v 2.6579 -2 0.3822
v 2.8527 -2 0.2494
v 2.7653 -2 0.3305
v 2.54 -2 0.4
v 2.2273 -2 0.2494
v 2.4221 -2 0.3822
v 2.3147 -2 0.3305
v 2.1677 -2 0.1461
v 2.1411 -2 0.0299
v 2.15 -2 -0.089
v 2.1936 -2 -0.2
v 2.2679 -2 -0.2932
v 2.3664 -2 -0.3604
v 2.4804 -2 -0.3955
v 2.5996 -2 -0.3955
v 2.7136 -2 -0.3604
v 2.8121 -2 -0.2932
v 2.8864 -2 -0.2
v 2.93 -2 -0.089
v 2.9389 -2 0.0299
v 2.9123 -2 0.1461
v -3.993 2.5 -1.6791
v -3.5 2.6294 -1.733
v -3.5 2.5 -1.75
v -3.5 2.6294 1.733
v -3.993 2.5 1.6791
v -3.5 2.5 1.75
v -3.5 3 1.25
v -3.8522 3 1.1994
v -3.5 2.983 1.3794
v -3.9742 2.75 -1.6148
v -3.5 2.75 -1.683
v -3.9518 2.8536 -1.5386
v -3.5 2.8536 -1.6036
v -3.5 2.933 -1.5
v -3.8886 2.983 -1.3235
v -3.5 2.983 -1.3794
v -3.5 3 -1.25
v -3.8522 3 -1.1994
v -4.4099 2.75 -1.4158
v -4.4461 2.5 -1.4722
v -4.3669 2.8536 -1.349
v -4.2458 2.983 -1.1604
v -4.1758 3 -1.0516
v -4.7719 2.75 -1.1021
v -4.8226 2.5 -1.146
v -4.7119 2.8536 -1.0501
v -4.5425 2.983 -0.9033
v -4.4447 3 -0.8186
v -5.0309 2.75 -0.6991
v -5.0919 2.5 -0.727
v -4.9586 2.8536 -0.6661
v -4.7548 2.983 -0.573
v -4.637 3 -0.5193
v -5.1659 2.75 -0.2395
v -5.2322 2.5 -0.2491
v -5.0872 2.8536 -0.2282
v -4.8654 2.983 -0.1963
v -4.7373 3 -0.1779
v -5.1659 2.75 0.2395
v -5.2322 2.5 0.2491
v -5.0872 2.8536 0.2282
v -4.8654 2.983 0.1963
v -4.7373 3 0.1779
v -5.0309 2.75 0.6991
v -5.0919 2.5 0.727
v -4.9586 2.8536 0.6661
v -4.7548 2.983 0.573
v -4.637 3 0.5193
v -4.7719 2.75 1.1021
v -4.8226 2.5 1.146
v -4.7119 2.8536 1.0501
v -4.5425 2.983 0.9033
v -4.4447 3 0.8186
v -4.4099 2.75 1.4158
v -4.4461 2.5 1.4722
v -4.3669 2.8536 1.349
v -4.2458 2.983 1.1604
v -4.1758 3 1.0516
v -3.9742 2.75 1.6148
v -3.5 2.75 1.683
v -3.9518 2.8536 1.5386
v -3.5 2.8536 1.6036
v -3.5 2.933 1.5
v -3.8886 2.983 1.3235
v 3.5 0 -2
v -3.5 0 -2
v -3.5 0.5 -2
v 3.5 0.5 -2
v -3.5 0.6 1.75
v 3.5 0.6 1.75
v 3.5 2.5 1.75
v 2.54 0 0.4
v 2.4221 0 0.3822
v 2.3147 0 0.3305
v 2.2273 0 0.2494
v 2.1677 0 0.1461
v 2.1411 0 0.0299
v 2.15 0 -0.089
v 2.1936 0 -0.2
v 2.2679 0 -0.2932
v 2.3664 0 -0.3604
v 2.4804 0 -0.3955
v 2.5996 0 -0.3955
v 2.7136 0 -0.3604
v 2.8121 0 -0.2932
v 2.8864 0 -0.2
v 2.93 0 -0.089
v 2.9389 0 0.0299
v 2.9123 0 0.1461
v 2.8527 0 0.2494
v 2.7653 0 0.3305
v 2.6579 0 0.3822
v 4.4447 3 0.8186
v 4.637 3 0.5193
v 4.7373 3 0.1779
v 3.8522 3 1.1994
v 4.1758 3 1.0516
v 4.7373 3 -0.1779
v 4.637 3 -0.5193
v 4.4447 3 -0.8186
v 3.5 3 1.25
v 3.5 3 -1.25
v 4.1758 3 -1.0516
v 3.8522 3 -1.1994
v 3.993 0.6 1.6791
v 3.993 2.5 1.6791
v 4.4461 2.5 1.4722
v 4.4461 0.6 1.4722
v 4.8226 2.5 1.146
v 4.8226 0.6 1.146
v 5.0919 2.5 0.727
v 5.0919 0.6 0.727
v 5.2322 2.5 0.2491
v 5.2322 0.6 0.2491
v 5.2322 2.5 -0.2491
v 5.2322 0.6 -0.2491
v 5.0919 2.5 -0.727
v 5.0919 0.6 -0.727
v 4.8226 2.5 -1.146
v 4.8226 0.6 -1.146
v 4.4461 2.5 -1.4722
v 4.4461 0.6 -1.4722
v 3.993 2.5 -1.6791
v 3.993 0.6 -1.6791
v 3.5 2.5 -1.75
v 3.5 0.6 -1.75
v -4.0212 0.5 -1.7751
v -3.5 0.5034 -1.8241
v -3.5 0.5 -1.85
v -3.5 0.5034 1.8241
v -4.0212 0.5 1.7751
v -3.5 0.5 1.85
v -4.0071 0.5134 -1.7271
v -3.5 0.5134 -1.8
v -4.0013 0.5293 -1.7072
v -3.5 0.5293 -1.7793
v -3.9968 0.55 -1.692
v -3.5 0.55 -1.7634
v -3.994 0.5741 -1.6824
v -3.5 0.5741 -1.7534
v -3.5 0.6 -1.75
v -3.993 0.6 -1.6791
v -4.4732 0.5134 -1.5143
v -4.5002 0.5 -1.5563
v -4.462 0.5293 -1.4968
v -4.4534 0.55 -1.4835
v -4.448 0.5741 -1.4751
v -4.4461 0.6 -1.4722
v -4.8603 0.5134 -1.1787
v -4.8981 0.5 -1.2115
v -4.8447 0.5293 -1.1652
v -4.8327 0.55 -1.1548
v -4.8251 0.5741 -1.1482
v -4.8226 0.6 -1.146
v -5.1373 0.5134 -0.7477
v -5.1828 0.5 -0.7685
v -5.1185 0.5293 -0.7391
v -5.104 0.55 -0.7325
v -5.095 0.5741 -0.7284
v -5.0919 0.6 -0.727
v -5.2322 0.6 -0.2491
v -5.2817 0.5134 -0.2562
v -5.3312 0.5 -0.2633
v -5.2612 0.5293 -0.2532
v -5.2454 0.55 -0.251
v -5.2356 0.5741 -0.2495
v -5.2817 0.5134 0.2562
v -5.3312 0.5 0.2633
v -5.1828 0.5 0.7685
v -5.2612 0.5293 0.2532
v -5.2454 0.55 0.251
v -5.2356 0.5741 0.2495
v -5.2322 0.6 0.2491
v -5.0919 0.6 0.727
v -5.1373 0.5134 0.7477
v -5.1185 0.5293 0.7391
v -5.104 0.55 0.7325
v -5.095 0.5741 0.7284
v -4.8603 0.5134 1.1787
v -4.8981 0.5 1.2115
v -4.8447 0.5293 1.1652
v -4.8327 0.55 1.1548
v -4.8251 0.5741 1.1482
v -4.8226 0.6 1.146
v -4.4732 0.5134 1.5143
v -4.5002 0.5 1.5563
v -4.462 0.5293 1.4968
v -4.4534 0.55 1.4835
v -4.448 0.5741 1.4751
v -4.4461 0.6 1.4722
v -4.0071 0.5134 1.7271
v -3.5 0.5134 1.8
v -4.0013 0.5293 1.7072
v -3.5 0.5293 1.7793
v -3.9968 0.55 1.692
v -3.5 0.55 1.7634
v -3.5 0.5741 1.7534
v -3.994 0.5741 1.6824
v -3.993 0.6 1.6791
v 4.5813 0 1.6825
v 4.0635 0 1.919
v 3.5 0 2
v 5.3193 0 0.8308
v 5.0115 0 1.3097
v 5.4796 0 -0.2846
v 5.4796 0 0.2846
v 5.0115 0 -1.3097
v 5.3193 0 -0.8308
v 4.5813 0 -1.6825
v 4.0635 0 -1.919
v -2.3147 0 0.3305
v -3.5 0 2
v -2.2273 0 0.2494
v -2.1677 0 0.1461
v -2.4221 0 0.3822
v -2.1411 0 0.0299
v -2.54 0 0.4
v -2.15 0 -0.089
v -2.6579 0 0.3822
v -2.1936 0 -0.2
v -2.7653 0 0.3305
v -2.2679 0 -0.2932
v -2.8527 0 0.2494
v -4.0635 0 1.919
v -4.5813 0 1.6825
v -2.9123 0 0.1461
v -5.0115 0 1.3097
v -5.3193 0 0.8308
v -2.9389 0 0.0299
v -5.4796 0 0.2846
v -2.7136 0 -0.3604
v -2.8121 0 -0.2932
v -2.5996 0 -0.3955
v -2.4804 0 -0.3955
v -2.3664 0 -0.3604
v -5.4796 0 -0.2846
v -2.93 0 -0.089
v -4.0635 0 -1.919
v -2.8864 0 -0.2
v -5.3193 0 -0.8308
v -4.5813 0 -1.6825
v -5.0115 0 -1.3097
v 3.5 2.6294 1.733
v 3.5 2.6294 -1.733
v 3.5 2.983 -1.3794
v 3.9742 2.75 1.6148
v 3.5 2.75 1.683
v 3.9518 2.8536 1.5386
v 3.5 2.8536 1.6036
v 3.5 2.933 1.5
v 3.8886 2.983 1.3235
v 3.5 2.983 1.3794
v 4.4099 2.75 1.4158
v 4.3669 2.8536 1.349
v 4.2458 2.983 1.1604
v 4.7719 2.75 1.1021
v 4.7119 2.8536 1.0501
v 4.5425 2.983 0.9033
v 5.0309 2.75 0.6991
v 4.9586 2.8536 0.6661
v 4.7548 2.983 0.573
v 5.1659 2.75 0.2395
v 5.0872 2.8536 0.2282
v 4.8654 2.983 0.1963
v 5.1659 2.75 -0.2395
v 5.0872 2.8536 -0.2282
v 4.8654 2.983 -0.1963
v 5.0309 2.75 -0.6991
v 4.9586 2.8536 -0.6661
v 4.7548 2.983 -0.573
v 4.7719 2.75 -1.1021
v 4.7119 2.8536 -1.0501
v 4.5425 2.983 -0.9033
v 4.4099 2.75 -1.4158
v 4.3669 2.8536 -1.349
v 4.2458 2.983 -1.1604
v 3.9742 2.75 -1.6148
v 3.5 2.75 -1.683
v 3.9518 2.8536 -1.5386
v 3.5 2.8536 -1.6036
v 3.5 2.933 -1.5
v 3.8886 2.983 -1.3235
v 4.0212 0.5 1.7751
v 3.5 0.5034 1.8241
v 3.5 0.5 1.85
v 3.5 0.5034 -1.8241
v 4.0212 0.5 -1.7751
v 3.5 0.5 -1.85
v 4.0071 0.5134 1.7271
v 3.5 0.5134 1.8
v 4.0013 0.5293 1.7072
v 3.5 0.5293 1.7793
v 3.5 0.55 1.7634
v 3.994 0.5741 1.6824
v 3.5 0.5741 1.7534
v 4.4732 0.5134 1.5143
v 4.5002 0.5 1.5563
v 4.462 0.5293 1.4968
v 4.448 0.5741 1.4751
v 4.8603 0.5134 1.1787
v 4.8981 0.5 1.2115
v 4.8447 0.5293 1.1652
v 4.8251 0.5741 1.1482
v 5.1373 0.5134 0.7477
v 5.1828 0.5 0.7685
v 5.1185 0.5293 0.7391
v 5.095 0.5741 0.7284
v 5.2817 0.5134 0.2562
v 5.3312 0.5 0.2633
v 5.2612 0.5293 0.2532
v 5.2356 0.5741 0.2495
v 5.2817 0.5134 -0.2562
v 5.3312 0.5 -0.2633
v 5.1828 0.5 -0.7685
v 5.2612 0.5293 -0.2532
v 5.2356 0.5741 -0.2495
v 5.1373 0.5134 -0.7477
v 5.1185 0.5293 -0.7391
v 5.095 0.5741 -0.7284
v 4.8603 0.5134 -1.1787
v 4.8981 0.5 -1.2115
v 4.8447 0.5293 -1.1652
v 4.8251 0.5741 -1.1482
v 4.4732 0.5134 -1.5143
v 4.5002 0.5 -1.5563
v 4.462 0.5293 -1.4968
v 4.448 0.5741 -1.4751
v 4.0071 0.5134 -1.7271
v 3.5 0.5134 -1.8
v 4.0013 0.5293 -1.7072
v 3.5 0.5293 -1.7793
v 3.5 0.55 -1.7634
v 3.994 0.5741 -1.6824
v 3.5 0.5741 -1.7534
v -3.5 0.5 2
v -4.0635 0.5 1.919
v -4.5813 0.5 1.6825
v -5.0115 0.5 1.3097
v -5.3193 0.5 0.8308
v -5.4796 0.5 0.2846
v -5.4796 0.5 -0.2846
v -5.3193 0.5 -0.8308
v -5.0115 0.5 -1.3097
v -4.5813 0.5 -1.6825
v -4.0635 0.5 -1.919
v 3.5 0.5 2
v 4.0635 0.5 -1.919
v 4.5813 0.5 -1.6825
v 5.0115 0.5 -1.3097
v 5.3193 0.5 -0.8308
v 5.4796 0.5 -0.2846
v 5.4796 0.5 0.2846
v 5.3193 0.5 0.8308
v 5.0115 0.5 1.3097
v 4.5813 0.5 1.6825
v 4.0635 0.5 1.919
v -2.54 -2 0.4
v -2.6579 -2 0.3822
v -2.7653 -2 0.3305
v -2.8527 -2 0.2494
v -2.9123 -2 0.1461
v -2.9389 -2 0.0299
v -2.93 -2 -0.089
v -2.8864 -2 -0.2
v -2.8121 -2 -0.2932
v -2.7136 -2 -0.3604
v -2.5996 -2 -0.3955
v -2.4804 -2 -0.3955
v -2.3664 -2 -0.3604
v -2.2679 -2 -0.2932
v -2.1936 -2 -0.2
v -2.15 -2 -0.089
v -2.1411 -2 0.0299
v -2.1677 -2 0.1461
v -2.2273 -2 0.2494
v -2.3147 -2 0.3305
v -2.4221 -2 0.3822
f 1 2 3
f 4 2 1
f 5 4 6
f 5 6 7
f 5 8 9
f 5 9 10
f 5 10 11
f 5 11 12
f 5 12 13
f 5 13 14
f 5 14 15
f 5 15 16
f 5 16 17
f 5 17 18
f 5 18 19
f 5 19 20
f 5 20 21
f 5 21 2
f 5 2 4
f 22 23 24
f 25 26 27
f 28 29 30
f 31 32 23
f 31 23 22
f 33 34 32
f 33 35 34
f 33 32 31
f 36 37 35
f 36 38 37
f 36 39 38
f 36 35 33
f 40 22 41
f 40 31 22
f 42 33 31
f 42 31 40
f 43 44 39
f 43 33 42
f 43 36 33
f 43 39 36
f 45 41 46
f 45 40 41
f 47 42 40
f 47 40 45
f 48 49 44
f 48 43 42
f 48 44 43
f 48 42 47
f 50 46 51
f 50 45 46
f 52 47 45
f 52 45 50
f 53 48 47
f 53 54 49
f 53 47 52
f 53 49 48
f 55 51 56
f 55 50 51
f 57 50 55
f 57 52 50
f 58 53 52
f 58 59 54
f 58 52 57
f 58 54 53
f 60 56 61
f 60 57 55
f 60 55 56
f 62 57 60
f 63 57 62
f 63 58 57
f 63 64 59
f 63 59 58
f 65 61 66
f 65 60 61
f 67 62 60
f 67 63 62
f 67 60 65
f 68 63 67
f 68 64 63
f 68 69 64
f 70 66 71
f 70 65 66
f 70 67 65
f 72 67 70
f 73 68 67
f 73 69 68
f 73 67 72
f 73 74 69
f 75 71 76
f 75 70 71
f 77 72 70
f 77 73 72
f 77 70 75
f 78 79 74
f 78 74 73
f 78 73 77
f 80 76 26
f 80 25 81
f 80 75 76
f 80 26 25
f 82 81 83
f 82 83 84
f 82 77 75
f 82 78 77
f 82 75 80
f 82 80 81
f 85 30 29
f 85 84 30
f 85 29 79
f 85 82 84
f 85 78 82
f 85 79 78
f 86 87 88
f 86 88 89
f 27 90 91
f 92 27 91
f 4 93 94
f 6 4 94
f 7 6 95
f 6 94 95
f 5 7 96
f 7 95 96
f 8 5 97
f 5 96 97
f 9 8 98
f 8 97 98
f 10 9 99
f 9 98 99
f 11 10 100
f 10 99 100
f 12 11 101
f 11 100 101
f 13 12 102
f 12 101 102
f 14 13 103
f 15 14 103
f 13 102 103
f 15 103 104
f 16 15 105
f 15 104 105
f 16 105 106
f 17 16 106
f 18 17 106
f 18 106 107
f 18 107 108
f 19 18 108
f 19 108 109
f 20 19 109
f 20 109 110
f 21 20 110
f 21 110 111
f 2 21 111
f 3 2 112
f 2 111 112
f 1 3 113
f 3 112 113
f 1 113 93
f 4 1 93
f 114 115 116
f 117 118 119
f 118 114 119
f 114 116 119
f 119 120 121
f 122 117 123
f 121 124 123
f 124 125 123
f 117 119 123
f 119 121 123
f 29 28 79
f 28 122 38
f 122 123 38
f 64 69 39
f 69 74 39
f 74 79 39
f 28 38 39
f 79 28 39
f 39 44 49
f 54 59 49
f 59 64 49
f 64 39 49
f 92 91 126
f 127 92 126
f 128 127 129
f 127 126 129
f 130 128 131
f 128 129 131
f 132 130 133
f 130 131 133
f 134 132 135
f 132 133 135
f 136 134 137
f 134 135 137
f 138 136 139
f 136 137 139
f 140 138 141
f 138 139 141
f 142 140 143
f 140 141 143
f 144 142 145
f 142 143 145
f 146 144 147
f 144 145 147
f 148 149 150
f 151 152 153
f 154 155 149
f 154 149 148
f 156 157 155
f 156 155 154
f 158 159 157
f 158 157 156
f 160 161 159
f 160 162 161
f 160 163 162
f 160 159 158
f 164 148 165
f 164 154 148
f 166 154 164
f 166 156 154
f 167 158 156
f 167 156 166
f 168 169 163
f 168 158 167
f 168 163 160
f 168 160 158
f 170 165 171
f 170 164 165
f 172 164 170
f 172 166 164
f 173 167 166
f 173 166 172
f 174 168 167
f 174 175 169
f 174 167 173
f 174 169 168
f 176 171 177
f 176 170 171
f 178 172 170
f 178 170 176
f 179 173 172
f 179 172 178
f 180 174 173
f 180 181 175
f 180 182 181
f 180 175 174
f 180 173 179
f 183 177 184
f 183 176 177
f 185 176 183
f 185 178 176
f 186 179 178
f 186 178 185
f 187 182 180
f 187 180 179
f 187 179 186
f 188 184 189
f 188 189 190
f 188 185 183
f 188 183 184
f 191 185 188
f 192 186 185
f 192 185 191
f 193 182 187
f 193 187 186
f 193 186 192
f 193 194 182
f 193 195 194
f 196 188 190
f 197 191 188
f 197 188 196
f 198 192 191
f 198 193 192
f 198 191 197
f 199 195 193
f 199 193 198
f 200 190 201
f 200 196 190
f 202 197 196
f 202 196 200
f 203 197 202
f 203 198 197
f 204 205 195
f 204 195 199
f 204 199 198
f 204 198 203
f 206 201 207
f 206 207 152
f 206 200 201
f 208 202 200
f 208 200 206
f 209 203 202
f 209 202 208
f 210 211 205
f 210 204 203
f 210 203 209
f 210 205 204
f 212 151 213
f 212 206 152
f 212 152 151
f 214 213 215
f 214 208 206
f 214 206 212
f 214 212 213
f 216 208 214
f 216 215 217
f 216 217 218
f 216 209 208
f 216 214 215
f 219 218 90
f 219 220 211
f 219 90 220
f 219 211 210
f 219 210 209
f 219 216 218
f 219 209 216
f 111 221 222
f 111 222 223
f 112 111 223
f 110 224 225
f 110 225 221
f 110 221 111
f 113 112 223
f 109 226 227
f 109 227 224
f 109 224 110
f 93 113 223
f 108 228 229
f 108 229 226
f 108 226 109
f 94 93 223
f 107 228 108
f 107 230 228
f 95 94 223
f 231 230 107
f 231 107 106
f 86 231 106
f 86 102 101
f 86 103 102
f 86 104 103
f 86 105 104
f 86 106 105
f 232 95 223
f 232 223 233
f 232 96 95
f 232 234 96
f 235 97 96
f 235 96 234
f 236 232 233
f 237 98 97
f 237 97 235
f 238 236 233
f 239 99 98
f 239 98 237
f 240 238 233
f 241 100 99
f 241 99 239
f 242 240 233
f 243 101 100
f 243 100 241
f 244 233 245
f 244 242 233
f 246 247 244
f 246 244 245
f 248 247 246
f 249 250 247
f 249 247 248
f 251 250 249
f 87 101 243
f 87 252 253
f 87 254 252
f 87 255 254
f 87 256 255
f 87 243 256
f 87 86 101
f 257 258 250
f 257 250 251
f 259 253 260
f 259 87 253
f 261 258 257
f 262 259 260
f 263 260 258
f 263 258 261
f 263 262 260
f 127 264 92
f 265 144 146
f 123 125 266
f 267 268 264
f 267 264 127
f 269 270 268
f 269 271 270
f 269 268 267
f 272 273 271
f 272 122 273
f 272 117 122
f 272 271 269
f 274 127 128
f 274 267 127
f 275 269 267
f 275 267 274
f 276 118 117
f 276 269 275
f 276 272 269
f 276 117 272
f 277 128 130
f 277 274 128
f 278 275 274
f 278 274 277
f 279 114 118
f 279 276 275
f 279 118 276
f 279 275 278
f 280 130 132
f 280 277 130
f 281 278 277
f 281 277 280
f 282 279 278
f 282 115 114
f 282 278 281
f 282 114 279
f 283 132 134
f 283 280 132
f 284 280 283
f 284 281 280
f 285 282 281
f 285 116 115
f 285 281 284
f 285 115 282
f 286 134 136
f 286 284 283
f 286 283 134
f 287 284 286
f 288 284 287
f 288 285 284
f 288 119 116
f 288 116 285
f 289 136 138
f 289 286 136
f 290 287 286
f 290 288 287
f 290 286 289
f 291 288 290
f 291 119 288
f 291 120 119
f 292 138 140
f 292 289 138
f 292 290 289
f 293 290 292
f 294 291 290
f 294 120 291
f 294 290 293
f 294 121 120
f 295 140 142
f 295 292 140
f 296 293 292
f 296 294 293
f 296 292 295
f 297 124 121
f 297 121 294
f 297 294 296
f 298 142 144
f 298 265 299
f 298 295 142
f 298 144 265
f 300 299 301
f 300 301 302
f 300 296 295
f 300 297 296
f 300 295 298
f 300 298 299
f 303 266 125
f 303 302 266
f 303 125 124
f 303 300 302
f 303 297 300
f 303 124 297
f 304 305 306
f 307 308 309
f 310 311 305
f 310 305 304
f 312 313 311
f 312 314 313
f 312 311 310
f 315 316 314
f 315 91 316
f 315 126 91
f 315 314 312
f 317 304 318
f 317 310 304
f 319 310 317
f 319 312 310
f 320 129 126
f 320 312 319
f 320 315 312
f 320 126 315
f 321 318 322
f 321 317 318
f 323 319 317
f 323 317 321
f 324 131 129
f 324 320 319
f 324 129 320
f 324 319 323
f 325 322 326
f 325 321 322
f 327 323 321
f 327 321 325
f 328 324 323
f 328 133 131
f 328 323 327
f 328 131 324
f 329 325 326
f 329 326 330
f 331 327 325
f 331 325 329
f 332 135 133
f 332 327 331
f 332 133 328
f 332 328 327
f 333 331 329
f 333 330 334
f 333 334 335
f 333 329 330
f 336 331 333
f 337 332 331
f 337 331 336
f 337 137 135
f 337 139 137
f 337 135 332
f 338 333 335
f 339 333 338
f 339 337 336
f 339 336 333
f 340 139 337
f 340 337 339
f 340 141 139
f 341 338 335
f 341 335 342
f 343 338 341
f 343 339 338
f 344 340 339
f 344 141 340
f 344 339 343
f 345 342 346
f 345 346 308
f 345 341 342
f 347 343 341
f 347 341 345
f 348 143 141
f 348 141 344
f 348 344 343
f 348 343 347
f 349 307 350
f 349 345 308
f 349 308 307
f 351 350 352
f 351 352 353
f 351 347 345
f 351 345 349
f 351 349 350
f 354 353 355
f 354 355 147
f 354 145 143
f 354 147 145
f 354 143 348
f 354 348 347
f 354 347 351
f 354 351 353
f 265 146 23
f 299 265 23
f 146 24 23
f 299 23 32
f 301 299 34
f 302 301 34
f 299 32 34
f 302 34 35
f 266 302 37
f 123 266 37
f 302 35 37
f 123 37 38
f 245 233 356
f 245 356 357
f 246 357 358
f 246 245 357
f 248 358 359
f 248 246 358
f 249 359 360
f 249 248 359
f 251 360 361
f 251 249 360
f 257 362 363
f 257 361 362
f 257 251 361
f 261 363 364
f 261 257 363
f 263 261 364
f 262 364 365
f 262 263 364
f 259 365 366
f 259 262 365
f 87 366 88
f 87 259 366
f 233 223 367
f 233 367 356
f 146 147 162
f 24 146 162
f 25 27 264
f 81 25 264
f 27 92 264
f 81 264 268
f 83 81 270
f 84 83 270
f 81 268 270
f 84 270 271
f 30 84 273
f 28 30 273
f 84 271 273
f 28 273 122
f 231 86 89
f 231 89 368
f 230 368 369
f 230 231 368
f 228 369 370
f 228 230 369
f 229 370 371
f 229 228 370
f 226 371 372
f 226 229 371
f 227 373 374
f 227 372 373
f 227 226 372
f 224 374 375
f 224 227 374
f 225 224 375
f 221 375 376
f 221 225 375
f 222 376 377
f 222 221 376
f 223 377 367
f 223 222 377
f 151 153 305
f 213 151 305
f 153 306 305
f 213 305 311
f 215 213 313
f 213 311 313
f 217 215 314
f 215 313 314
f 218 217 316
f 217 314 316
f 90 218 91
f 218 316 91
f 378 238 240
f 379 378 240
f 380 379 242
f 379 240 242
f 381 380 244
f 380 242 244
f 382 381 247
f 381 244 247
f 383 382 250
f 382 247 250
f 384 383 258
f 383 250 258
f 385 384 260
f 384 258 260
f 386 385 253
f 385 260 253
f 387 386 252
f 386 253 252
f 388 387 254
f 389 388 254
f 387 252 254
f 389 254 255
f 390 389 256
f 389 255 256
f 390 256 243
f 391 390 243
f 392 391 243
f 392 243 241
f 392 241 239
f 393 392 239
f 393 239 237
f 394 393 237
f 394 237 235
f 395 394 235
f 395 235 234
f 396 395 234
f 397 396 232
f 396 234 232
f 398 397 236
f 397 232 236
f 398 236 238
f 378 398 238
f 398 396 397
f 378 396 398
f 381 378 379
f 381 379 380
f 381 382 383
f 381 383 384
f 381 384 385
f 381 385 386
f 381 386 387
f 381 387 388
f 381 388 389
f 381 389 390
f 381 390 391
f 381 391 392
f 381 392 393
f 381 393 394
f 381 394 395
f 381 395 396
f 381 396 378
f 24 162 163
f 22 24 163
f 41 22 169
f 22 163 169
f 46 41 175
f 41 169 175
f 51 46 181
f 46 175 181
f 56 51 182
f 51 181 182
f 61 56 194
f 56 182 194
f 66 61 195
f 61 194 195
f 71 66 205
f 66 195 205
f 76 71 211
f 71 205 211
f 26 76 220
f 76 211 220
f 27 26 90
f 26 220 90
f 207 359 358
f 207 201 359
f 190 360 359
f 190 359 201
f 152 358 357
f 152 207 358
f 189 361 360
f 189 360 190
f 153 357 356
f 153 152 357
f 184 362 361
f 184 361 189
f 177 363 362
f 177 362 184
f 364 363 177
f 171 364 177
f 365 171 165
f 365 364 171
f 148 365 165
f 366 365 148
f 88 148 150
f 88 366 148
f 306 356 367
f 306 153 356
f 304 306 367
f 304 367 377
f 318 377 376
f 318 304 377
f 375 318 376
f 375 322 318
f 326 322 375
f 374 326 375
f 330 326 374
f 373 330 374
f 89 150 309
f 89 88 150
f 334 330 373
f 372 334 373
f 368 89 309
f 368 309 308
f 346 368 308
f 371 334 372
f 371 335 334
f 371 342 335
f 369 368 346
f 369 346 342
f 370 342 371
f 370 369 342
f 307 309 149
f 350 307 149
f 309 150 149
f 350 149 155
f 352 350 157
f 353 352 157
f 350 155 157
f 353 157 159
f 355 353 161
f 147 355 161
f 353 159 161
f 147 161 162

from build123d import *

# Parameters (mm, degrees)
BOSS_EXTRUDE1_DEPTH = 3
CUT_EXTRUDE1_START  = -2.5
CUT_EXTRUDE1_DEPTH  = 2.5
FILLET1_R           = 0.5
SKETCH3_R           = 0.4
BOSS_EXTRUDE2_DEPTH = 2
FILLET2_R           = 0.1


with BuildPart() as part:
    # Sketch1 → Boss-Extrude1 (new body)
    with BuildSketch(Plane(origin=(0, 0, 0), x_dir=(1, 0, 0), z_dir=(0, 1, 0))):
        with BuildLine():
            Line((-3.5, 2), (3.5, 2))
            ThreePointArc((3.5, 2), (5.5, 0), (3.5, -2))
            Line((3.5, -2), (-3.5, -2))
            ThreePointArc((-3.5, -2), (-5.5, 0), (-3.5, 2))
        make_face()
    extrude(amount=BOSS_EXTRUDE1_DEPTH)

    # Sketch2 → Cut-Extrude1 (cut)
    with BuildSketch(Plane(origin=(0, 3, 0), x_dir=(1, 0, 0), z_dir=(0, 1, 0)).offset(CUT_EXTRUDE1_START)):
        with BuildLine():
            Line((-3.5, -2), (3.5, -2))
            ThreePointArc((3.5, -2), (5.5, 0), (3.5, 2))
            Line((3.5, 2), (-3.5, 2))
            ThreePointArc((-3.5, 2), (-5.5, 0), (-3.5, -2))
        make_face()
        with BuildLine():
            Line((-3.5, -1.75), (3.5, -1.75))
            ThreePointArc((3.5, -1.75), (5.25, 0), (3.5, 1.75))
            Line((3.5, 1.75), (-3.5, 1.75))
            ThreePointArc((-3.5, 1.75), (-5.25, 0), (-3.5, -1.75))
        make_face(mode=Mode.SUBTRACT)
    extrude(amount=CUT_EXTRUDE1_DEPTH, mode=Mode.SUBTRACT)

    # Fillet1
    fillet1_edges = [part.edges().sort_by_distance(p)[0] for p in [
        (-5.25, 3, 0),
        (0, 3, -1.75),
        (5.25, 3, 0),
        (0, 3, 1.75),
    ]]
    fillet(fillet1_edges, radius=FILLET1_R)

    # Sketch3 → Boss-Extrude2 (add)
    with BuildSketch(Plane.XZ):
        with Locations(Location((-2.54, 0, 0), (0, 0, 90))):
            Circle(SKETCH3_R)
        with Locations(Location((2.54, 0, 0), (0, 0, 90))):
            Circle(SKETCH3_R)
    extrude(amount=BOSS_EXTRUDE2_DEPTH)

    # Fillet2
    fillet2_edges = [part.edges().sort_by_distance(p)[0] for p in [
        (0, 0.5, -1.75),
        (-5.25, 0.5, 0),
        (0, 0.5, 1.75),
        (5.25, 0.5, 0),
    ]]
    fillet(fillet2_edges, radius=FILLET2_R)


solid = part.part
